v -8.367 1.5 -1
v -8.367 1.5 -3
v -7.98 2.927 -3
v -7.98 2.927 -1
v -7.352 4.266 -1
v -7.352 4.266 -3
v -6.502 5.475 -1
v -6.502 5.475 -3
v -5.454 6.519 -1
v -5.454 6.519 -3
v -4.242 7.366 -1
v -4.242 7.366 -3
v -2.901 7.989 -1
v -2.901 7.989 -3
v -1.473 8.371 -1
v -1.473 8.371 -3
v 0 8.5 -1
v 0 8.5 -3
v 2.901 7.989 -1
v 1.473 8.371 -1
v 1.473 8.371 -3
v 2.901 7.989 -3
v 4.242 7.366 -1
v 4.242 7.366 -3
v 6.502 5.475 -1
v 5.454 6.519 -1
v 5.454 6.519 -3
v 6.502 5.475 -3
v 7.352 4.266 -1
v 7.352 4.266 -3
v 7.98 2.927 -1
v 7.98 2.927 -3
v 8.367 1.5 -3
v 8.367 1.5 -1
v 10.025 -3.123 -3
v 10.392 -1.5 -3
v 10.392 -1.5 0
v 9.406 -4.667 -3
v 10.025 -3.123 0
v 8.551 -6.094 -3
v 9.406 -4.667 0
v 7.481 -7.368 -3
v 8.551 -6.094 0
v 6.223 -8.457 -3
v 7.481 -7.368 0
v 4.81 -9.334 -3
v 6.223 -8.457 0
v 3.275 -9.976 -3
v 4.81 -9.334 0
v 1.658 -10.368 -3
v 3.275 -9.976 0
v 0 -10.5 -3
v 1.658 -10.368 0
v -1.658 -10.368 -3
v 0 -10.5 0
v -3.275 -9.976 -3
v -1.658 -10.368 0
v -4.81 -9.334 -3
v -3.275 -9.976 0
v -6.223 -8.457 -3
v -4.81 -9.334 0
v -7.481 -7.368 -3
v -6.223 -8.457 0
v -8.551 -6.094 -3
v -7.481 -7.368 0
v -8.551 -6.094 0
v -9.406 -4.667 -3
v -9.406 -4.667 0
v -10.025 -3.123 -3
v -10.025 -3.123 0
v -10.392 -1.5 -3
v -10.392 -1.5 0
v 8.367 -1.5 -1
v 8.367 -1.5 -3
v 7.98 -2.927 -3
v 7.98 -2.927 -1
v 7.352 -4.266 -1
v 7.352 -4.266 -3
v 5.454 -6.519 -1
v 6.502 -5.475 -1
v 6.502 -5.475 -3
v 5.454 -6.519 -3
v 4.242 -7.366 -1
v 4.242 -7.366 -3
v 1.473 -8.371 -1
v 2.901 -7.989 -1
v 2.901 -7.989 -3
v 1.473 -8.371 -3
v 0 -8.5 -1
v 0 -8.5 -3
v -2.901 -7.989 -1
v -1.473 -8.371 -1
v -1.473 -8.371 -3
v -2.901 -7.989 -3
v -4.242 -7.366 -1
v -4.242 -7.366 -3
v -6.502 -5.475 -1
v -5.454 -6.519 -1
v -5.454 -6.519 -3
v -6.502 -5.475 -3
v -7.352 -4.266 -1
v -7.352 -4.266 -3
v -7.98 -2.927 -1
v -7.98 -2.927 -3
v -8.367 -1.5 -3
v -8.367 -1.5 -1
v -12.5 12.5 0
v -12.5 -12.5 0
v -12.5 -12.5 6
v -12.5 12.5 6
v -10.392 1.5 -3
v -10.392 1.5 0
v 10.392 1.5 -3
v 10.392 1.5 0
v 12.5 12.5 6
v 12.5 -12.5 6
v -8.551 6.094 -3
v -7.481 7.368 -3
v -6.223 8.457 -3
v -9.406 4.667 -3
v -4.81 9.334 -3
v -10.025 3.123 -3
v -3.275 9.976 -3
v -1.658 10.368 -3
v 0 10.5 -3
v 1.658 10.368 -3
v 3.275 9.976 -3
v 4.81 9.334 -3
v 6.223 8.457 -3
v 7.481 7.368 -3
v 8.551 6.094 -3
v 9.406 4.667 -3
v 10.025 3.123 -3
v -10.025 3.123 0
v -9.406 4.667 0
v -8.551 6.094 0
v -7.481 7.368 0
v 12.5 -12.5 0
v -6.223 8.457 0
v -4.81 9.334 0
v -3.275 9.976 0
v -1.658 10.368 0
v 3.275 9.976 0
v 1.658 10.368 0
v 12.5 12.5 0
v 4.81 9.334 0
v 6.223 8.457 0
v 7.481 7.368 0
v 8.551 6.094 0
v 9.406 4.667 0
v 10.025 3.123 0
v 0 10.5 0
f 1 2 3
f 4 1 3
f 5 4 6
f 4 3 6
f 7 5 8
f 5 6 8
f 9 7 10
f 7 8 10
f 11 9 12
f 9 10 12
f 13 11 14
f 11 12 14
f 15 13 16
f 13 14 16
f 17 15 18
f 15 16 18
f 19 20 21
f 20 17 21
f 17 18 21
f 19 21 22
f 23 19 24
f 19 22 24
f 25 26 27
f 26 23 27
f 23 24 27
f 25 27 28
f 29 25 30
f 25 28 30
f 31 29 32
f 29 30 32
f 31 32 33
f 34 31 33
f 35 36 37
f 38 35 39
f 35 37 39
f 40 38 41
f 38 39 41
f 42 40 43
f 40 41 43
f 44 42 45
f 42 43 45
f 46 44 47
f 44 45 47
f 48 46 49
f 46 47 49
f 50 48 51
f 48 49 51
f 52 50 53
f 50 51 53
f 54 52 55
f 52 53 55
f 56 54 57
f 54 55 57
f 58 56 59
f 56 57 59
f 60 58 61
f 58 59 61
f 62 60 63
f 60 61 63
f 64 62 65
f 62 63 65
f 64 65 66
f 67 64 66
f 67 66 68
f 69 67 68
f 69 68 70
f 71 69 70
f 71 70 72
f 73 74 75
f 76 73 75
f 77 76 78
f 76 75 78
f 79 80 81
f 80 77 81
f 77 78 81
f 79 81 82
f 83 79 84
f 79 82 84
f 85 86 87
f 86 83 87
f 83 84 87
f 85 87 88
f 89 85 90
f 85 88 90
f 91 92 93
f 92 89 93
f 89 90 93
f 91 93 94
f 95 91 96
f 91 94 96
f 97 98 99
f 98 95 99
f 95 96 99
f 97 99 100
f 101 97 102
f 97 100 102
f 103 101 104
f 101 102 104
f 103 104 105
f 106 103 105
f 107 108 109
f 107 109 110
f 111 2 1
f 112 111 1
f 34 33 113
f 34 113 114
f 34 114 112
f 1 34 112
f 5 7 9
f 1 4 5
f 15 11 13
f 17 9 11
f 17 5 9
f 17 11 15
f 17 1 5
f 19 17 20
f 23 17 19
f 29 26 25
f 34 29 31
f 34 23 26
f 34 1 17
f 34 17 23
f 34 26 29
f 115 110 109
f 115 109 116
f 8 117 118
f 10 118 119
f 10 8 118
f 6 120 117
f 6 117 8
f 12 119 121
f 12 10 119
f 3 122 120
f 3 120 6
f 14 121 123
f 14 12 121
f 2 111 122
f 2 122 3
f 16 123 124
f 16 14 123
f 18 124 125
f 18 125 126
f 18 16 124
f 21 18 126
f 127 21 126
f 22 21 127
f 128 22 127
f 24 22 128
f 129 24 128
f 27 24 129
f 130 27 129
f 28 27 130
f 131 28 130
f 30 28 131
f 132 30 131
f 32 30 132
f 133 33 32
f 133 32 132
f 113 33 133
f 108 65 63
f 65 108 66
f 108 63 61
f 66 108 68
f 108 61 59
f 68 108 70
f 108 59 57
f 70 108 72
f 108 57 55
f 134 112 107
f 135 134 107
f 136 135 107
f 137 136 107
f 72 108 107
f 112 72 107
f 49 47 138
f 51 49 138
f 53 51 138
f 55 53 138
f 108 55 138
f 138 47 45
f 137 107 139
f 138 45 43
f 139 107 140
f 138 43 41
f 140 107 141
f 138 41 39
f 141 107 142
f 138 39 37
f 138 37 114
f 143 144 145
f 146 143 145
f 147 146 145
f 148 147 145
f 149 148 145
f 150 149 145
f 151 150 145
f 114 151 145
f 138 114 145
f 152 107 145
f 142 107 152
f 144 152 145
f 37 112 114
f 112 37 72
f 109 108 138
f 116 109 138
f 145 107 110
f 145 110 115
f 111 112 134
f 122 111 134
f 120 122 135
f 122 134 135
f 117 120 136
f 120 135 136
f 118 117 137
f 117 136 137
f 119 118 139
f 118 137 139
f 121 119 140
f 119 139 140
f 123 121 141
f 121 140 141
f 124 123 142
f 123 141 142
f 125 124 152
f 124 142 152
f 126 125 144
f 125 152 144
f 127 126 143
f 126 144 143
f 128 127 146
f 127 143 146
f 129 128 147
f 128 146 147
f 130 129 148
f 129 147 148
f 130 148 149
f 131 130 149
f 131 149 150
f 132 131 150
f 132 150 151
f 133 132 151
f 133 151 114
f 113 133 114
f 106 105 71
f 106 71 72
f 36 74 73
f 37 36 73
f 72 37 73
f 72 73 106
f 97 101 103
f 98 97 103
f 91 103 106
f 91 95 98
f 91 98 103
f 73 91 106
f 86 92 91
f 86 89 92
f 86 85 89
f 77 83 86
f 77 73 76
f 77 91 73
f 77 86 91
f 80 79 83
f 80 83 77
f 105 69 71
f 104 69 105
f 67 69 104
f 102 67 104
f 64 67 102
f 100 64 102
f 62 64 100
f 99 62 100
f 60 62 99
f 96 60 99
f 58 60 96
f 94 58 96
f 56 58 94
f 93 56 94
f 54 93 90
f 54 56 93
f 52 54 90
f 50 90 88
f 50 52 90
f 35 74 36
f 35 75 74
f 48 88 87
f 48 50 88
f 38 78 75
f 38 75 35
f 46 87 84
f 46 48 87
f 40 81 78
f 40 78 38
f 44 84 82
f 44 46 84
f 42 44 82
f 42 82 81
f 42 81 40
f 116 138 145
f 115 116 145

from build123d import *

# Parameters (mm, degrees)
F0_W          = 25
F0_H          = 25
F1_DEPTH      = 6
F2_R          = 10.5
F3_DEPTH      = 3
F4_R          = 8.5
F5_DEPTH      = 2
F6_W          = 3
F6_H          = 5
F7_DEPTH      = 25
F7_DEPTH_BACK = 25


with BuildPart() as f1:
    # F0 (on Top) → F1 (new body)
    with BuildSketch(Plane.XY):
        Rectangle(F0_W, F0_H)
    extrude(amount=F1_DEPTH)

    # F2 (on face) → F3 (join)
    with BuildSketch(Plane(origin=(0, 0, 0), x_dir=(1, 0, 0), z_dir=(0, 0, -1))):
        Circle(F2_R)
    extrude(amount=F3_DEPTH)

    # F4 (on face) → F5 (cut)
    with BuildSketch(Plane(origin=(0, 0, -3), x_dir=(1, 0, 0), z_dir=(0, 0, -1))):
        Circle(F4_R)
    extrude(amount=-F5_DEPTH, mode=Mode.SUBTRACT)

    # F6 (on Right) → F7 (cut, two sides)
    with BuildSketch(Plane.YZ) as f7_sk:
        with Locations((0, -2.5)):
            Rectangle(F6_W, F6_H)
    extrude(amount=-F7_DEPTH, mode=Mode.SUBTRACT)
    extrude(f7_sk.sketch, amount=F7_DEPTH_BACK, mode=Mode.SUBTRACT)


solid = f1.part
